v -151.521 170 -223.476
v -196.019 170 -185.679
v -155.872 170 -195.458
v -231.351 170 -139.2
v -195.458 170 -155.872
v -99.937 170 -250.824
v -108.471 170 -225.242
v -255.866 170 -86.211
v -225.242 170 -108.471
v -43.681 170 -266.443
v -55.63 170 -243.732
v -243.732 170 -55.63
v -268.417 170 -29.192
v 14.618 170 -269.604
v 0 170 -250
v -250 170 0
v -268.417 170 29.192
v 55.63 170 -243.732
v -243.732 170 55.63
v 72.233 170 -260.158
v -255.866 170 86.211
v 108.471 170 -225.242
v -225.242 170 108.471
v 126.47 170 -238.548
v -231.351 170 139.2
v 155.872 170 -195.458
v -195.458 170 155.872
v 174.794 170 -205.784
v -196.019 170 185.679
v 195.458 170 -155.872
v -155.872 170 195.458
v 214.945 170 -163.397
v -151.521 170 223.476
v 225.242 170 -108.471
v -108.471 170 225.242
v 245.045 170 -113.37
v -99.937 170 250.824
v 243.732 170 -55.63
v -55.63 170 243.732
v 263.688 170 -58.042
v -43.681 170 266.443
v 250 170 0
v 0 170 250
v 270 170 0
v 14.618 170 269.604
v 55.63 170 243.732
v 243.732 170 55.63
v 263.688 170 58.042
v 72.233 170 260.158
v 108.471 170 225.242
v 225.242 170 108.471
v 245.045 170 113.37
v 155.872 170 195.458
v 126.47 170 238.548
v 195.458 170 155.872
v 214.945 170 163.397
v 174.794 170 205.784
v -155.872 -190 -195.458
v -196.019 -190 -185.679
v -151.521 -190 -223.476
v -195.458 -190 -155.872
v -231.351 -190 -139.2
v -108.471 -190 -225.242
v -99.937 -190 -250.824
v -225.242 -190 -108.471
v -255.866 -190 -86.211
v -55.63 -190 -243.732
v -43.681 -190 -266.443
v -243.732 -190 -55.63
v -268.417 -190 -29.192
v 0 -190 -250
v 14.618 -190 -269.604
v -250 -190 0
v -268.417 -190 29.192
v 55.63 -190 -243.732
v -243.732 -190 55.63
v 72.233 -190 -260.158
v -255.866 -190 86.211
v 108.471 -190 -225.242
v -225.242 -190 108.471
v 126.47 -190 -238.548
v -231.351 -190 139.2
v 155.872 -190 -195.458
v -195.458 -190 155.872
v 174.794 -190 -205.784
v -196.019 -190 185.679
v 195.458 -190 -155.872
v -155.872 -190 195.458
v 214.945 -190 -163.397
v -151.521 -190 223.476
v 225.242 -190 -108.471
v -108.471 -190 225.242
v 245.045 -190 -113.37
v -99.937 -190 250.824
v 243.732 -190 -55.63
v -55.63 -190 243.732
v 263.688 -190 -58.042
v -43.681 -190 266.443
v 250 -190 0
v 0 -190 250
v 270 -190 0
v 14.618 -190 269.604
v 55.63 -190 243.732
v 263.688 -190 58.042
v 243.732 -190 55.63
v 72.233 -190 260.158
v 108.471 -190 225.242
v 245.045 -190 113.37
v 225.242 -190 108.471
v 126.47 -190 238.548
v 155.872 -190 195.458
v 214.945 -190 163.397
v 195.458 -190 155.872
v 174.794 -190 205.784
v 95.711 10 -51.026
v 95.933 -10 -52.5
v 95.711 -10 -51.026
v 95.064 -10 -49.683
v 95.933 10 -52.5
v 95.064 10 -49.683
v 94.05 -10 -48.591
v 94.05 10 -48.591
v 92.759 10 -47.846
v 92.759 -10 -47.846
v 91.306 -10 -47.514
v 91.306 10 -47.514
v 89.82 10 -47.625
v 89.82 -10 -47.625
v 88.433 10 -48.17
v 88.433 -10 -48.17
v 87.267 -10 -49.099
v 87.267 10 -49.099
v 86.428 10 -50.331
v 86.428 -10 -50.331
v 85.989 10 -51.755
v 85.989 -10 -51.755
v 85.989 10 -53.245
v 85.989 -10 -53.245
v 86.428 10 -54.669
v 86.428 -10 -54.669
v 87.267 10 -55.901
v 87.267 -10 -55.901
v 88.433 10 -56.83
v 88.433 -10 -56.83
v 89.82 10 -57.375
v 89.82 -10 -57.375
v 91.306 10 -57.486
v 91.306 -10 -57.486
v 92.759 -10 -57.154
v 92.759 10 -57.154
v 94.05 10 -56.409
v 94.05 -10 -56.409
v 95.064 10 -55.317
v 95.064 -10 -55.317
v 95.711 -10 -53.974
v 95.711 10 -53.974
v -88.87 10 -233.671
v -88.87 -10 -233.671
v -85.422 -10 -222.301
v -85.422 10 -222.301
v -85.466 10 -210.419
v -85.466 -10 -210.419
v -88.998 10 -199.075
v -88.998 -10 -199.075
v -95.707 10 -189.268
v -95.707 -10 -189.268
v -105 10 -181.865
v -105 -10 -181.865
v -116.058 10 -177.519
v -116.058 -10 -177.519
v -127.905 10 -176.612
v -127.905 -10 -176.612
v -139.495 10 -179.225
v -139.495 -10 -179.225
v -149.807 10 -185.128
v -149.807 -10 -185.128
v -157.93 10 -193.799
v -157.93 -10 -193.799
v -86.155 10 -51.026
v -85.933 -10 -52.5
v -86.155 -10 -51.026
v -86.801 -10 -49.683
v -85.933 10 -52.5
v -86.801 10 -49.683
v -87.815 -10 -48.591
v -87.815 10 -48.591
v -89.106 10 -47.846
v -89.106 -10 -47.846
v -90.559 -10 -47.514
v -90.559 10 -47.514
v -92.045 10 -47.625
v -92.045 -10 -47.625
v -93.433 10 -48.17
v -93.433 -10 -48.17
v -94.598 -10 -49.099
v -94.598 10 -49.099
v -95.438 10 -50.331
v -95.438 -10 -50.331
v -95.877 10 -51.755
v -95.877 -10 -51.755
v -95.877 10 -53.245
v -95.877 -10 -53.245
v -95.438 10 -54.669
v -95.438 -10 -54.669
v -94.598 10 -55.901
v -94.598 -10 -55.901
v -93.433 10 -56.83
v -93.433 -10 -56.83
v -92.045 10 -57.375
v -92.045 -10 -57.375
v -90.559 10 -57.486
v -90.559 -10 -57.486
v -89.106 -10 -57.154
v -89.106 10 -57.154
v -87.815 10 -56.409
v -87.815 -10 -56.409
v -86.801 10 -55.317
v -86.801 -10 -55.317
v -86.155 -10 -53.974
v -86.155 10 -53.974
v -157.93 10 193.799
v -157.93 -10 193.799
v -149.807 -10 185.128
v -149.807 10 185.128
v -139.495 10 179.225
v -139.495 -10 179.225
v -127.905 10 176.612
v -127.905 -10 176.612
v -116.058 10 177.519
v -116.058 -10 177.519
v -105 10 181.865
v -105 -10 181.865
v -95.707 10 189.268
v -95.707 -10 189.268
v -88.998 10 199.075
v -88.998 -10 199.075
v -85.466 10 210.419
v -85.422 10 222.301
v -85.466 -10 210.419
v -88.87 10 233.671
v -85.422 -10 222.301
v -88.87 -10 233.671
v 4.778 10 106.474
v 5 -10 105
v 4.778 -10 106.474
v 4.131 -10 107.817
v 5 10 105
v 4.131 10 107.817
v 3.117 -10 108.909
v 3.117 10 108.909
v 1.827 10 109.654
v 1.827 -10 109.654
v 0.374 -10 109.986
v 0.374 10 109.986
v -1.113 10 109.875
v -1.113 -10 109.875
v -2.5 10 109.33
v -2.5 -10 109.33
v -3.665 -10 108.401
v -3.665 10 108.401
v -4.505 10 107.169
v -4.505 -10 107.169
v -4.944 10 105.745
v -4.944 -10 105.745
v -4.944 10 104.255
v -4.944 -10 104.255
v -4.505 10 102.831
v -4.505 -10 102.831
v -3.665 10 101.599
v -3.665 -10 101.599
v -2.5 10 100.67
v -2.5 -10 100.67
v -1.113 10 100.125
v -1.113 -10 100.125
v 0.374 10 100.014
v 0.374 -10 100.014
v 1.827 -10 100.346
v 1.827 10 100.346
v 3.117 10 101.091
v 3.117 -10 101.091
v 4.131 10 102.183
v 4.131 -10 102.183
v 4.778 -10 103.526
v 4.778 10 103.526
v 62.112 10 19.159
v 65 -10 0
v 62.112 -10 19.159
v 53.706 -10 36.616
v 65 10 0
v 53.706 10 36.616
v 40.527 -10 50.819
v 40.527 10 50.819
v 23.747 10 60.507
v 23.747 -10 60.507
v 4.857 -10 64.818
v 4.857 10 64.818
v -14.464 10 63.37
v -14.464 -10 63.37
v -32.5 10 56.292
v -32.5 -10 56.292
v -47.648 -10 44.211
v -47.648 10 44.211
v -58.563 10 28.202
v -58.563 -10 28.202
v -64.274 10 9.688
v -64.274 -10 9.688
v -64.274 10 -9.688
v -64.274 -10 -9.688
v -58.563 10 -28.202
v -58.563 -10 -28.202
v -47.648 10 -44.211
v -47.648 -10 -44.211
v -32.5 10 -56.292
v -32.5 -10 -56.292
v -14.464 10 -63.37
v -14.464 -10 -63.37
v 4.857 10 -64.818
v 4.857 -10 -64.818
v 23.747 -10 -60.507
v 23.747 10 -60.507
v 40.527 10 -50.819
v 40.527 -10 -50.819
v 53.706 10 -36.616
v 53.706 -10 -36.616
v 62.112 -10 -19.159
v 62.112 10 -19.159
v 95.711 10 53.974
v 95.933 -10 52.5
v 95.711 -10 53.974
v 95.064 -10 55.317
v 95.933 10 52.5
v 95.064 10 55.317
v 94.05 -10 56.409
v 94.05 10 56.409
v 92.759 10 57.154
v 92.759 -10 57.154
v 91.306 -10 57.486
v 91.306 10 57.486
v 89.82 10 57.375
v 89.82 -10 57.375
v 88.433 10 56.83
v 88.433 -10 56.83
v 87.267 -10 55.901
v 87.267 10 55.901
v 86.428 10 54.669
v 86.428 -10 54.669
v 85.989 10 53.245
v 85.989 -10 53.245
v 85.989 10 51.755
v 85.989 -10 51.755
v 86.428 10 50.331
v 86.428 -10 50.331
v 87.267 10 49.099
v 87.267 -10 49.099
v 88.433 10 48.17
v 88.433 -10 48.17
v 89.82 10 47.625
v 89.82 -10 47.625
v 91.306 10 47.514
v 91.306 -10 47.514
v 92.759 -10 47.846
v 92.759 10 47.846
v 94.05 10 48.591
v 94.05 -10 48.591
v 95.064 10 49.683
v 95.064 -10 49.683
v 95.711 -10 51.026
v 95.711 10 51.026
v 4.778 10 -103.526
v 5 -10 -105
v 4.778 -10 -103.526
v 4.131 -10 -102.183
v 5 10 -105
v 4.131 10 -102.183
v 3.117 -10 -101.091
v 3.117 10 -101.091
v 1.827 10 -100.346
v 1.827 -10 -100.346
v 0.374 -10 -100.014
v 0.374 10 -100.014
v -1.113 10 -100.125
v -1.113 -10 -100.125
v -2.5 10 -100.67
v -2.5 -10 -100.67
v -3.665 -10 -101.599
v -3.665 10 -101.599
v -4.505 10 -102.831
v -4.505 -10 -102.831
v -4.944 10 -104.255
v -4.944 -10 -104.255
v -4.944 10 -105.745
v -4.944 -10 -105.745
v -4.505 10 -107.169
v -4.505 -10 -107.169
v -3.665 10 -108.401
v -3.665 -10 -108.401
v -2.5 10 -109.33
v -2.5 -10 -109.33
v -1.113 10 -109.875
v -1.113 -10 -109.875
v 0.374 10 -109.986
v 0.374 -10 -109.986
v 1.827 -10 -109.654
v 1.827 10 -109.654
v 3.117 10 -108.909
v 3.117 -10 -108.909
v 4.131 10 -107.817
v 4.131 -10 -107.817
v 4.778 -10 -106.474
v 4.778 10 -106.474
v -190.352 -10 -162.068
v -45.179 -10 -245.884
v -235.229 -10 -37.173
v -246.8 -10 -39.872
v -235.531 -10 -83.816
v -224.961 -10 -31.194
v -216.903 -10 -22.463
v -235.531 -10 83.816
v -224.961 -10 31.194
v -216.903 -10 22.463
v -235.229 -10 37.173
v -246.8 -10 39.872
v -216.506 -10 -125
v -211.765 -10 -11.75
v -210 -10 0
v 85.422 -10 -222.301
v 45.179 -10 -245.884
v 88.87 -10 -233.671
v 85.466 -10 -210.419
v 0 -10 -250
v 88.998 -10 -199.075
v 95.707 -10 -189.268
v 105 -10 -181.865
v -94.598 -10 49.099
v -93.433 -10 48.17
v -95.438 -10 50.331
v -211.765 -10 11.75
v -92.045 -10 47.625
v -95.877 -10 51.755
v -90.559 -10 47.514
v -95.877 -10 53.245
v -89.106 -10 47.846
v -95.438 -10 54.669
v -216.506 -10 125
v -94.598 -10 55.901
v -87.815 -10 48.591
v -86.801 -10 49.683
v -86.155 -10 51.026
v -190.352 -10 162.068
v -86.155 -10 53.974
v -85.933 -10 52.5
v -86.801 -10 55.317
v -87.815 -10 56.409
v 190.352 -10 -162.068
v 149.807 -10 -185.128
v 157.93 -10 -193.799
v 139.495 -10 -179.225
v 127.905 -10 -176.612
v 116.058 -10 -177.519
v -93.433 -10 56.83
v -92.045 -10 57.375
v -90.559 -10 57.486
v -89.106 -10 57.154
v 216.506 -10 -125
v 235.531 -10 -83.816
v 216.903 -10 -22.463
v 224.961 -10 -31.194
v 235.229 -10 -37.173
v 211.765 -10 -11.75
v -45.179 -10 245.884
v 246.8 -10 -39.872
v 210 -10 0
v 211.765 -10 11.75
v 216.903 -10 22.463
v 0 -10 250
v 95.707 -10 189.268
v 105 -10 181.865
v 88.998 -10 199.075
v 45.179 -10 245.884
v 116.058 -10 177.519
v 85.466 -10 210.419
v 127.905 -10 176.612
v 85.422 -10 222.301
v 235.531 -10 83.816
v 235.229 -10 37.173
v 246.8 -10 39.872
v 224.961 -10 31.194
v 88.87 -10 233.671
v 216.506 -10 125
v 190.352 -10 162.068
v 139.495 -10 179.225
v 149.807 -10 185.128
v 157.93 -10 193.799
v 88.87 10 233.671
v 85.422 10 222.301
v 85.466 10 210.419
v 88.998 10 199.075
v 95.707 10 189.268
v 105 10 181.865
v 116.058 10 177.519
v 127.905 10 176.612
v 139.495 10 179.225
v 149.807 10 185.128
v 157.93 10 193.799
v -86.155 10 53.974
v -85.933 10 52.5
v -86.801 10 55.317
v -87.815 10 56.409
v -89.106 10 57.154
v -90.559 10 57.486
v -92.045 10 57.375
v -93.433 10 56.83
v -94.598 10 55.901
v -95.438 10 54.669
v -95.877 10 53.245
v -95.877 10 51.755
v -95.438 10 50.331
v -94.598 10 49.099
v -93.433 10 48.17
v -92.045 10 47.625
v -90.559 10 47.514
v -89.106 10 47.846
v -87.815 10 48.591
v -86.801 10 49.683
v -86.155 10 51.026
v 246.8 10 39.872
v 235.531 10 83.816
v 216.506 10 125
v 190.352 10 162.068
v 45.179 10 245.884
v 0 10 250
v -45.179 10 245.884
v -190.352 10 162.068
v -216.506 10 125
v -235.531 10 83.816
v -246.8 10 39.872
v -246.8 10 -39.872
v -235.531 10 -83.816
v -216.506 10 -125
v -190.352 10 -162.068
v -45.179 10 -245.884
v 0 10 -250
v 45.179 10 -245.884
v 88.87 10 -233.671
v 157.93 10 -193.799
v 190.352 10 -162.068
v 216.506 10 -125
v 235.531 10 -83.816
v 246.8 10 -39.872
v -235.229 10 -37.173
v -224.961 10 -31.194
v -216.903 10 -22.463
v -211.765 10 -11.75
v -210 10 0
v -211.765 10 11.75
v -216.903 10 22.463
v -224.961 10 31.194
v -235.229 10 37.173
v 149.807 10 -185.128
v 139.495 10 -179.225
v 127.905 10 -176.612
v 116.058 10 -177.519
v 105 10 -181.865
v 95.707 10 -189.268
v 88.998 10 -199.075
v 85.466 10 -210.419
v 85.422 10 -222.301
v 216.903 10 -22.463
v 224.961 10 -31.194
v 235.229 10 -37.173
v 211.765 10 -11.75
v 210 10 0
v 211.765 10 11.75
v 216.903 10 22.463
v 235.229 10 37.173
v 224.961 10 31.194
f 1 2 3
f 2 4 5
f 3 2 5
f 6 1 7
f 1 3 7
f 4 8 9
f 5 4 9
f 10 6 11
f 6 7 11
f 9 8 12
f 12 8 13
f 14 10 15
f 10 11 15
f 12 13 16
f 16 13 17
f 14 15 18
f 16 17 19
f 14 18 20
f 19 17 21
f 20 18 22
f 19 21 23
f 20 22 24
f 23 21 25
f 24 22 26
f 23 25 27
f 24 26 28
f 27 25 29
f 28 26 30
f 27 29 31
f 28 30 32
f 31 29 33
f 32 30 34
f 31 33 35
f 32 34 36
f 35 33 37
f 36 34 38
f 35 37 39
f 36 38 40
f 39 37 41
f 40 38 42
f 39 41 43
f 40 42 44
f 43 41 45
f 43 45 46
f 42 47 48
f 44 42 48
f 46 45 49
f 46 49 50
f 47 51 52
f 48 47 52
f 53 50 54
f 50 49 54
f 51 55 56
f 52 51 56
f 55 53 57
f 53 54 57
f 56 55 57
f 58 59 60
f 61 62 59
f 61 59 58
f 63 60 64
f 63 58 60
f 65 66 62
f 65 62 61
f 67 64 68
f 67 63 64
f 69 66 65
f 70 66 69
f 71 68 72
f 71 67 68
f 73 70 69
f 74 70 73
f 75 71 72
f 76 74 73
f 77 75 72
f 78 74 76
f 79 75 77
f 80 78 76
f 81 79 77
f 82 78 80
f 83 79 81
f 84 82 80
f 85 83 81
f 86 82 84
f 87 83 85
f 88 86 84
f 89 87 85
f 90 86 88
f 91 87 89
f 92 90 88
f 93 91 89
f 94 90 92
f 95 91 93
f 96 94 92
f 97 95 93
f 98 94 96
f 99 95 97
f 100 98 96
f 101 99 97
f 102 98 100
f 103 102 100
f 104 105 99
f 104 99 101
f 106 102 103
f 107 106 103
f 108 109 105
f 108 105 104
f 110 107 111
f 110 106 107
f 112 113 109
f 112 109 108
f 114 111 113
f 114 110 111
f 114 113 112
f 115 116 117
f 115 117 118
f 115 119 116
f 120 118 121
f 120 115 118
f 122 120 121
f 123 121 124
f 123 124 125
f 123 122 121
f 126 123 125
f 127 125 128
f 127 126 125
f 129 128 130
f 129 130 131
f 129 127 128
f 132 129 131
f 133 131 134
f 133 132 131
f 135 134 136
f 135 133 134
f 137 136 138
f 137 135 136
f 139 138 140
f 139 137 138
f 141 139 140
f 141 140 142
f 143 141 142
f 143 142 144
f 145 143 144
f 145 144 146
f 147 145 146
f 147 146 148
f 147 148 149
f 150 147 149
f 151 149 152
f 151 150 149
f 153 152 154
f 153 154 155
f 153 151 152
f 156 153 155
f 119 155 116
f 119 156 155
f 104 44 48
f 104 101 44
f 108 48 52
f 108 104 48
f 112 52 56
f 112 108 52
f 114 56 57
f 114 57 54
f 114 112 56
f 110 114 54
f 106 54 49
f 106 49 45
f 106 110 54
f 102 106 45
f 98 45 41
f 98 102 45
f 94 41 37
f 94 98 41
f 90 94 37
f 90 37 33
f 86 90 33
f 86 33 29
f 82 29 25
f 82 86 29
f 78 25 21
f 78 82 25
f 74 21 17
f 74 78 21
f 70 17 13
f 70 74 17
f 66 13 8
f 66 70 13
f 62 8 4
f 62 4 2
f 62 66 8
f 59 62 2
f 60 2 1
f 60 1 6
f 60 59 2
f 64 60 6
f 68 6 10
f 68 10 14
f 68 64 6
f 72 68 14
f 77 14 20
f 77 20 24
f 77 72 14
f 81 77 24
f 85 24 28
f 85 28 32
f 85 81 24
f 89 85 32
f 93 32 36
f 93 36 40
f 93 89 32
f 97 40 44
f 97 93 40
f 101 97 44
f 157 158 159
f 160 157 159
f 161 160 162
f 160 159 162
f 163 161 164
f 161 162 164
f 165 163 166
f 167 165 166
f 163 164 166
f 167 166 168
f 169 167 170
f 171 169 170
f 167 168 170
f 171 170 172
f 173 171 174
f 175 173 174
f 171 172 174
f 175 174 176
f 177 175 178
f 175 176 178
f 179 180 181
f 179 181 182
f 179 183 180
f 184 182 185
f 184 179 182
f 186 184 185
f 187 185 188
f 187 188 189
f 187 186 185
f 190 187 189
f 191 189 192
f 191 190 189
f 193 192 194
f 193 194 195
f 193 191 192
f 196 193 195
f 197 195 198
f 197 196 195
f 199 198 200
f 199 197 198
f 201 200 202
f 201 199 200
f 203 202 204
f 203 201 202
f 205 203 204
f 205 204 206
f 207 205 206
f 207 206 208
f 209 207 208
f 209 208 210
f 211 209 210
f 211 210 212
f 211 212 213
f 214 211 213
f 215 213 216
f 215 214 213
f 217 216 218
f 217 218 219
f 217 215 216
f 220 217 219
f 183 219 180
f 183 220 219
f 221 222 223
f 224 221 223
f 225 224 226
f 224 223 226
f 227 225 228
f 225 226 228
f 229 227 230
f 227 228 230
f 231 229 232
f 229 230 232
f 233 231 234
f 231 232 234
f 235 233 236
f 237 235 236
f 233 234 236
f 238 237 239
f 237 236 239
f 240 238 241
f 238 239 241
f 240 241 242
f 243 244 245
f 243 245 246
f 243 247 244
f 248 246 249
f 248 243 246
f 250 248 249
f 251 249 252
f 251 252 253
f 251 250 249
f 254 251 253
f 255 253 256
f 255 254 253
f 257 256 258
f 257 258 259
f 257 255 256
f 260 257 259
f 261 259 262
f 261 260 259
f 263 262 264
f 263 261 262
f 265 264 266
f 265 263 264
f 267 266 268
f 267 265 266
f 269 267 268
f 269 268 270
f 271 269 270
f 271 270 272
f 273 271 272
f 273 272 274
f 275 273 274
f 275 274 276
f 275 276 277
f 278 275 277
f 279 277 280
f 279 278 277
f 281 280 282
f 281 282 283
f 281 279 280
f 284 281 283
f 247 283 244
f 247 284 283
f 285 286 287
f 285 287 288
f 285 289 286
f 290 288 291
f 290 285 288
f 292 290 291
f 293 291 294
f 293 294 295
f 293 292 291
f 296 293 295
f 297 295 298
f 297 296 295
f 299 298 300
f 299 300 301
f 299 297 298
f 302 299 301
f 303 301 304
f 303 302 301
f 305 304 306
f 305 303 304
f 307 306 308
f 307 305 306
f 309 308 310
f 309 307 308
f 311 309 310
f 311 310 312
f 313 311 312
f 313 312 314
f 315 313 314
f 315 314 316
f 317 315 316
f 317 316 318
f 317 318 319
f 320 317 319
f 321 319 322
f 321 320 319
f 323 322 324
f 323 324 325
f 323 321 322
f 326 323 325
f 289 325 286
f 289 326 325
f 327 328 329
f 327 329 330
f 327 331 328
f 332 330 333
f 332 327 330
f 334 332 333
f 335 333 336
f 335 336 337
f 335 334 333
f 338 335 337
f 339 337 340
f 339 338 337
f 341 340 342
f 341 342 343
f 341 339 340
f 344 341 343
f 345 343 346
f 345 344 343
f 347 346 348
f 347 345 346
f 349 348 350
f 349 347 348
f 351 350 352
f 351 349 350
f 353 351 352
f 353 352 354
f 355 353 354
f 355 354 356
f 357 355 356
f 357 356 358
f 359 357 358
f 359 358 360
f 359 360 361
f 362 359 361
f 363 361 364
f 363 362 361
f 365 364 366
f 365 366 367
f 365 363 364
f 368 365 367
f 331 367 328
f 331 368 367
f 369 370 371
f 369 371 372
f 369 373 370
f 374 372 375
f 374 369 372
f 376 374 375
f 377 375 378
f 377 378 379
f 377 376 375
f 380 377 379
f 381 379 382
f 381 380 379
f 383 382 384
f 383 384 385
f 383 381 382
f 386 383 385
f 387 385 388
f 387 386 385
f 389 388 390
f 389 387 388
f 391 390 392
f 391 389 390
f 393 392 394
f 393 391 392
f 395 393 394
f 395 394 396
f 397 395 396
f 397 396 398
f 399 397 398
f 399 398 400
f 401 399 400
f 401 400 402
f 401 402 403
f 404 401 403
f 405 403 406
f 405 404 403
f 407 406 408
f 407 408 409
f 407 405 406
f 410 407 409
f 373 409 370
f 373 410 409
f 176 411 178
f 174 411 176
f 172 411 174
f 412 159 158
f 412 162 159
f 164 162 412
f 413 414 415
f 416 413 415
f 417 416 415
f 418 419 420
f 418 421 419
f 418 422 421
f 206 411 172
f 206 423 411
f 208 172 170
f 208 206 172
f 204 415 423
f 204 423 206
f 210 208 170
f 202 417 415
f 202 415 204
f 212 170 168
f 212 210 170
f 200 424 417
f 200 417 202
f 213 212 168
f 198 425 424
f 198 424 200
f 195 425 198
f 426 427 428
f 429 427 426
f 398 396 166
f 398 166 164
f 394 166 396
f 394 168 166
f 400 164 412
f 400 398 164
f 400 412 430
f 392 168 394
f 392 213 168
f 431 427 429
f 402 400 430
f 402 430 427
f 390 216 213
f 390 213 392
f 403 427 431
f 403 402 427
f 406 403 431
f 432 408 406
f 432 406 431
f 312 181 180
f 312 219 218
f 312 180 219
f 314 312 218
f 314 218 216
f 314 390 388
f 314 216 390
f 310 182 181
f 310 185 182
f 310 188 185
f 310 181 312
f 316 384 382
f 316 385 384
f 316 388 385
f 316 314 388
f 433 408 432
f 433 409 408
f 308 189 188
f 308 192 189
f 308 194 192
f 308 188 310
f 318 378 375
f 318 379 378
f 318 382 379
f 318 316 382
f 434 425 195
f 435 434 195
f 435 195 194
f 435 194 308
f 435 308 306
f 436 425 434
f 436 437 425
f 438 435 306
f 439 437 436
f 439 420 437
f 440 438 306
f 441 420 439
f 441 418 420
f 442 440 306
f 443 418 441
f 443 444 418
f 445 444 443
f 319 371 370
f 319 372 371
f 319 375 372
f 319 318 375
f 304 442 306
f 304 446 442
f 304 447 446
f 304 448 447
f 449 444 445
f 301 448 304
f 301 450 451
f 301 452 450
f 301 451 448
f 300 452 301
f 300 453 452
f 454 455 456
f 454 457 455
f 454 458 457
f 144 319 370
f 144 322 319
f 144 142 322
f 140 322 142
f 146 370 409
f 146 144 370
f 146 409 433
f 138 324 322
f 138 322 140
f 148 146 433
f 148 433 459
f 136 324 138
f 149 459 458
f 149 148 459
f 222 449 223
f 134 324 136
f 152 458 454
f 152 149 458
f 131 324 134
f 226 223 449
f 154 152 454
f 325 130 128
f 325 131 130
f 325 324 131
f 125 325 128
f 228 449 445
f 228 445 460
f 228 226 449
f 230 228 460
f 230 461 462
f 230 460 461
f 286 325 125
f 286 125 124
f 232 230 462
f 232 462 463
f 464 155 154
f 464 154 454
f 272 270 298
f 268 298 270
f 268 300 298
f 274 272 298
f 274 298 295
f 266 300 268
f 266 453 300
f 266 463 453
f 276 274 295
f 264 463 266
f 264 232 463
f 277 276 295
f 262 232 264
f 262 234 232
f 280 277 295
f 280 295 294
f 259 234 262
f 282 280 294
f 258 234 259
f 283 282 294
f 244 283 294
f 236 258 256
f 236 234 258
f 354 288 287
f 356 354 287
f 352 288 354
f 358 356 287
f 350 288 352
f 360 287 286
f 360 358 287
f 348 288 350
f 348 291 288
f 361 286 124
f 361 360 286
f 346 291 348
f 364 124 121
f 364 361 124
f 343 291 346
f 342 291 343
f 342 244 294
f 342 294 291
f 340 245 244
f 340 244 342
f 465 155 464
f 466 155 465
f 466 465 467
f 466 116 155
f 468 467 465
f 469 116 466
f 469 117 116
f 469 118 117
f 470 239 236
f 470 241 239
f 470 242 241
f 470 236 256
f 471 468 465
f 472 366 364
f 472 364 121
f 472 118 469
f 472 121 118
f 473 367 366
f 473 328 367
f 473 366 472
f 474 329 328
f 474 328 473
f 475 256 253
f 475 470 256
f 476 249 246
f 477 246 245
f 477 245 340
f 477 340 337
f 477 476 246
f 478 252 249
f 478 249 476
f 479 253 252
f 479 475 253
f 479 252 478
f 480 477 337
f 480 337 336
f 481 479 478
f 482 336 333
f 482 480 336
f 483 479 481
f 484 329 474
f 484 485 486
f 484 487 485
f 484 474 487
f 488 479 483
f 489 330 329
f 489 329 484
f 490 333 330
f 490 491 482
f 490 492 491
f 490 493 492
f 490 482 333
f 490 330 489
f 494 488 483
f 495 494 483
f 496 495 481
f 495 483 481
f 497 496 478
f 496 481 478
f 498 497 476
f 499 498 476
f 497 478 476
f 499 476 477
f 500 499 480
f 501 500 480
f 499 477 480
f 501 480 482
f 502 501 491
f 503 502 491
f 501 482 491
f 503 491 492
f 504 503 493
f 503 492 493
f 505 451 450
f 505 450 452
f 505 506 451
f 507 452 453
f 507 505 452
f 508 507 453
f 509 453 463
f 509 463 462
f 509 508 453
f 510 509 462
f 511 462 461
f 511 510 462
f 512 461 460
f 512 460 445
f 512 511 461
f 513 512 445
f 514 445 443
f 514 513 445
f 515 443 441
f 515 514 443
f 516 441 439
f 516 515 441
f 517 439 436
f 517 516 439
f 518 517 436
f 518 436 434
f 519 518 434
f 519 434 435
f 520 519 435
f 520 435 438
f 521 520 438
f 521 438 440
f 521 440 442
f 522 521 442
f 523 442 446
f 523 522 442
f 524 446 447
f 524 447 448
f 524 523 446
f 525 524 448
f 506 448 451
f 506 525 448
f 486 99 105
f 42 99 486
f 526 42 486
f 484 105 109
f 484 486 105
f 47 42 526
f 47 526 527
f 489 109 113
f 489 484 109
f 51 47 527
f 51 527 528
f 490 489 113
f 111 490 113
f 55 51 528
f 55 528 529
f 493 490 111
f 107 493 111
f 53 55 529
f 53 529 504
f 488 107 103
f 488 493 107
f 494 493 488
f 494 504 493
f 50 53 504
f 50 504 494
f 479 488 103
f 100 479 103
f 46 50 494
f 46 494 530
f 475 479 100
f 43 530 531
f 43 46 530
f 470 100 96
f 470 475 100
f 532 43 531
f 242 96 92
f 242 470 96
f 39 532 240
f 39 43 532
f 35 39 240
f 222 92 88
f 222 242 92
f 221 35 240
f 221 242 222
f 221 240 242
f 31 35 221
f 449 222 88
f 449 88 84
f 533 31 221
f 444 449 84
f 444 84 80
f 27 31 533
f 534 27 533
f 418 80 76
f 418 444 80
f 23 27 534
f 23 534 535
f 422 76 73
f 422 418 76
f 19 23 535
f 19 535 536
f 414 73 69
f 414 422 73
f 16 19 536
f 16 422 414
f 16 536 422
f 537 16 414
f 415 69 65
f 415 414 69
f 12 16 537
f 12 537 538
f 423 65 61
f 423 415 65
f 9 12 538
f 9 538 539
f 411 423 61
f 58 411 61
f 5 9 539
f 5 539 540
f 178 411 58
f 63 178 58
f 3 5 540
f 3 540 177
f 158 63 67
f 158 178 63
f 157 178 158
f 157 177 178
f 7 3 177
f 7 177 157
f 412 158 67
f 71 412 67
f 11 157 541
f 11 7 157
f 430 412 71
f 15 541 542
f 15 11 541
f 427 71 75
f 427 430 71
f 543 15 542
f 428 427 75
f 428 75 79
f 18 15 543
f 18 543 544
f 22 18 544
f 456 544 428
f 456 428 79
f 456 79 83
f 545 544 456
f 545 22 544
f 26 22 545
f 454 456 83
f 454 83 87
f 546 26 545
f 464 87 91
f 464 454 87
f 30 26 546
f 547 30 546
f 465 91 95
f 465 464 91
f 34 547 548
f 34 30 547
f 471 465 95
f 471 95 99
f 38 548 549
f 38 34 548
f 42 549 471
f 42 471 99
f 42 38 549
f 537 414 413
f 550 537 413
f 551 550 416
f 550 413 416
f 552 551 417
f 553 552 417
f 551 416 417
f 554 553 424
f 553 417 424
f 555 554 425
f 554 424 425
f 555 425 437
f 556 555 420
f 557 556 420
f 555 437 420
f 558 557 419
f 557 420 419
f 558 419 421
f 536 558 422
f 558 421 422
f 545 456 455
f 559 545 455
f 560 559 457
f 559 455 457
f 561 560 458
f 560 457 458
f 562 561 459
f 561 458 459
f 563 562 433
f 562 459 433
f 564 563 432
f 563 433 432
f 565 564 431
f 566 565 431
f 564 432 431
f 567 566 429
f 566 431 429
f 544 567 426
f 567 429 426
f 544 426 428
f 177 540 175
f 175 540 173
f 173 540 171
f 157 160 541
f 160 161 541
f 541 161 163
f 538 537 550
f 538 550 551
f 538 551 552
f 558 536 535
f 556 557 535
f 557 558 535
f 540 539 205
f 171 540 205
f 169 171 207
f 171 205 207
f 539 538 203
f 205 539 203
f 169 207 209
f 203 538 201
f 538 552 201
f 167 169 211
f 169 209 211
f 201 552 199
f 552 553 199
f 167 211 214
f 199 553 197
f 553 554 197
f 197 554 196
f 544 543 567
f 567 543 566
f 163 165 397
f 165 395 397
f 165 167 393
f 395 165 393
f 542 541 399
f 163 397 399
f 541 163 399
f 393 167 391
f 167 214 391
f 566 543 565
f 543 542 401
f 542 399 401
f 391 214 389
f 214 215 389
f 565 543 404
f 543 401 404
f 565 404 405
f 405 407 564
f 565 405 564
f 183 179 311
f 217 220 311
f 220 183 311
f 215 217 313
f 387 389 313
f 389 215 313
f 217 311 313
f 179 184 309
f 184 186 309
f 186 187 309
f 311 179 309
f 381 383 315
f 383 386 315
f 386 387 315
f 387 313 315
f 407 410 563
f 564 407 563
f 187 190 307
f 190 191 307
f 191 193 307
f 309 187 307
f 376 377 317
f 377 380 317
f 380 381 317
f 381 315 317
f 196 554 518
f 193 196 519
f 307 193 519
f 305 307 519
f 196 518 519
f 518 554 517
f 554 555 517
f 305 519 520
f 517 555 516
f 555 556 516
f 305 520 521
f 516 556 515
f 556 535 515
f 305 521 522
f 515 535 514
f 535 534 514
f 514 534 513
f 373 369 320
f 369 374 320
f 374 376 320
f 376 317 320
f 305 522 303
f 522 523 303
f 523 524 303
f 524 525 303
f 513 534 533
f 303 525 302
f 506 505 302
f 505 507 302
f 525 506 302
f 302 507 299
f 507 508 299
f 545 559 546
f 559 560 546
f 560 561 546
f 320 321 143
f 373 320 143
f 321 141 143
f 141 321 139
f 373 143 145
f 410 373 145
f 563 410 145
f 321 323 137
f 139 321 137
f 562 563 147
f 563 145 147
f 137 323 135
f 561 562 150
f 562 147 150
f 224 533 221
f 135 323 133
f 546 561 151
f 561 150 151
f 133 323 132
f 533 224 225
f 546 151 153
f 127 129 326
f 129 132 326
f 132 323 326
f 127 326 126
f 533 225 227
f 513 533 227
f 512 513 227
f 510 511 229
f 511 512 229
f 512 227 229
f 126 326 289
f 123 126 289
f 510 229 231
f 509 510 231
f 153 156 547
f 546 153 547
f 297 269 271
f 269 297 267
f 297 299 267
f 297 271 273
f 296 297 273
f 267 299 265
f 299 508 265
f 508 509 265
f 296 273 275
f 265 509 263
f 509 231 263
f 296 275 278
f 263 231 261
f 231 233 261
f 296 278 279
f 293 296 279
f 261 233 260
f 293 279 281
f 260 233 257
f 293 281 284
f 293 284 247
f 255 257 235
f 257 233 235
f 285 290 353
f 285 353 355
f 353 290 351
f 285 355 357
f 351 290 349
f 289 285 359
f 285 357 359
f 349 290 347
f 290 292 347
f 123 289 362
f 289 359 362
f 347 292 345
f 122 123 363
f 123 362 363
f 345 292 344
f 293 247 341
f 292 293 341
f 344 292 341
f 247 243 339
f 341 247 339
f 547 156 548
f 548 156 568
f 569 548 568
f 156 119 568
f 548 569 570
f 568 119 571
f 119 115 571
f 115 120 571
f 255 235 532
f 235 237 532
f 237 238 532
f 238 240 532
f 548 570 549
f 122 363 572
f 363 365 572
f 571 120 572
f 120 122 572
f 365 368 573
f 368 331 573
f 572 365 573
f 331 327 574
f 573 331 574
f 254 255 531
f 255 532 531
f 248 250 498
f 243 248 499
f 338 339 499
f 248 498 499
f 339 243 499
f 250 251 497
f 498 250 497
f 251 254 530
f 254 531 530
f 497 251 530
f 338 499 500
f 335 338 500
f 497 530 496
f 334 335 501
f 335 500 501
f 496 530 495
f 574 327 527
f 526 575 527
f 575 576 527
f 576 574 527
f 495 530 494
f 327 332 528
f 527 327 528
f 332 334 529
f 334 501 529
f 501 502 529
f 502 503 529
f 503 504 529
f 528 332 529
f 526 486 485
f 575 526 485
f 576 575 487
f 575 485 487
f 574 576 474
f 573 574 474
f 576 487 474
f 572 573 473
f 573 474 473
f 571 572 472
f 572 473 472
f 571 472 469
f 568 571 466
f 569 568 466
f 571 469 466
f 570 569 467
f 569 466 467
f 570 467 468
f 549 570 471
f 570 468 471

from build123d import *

# Parameters (mm, degrees)
F0_R     = 250
F0_R_2   = 5
F0_R_3   = 65
F1_DEPTH = 10
F3_DEPTH = 20.001
F4_R     = 270
F4_R_2   = 250
F5_DEPTH = 180


with BuildPart() as f1:
    # F0 (on Front) → F1 (new body, symmetric)
    with BuildSketch(Plane.XZ):
        Circle(F0_R)
        with Locations((-90.932667, -52.5)):
            Circle(F0_R_2, mode=Mode.SUBTRACT)
        with Locations((0, -105)):
            Circle(F0_R_2, mode=Mode.SUBTRACT)
        with Locations((90.932667, -52.5)):
            Circle(F0_R_2, mode=Mode.SUBTRACT)
        with Locations((-90.932667, 52.5)):
            Circle(F0_R_2, mode=Mode.SUBTRACT)
        Circle(F0_R_3, mode=Mode.SUBTRACT)
        with Locations((90.932667, 52.5)):
            Circle(F0_R_2, mode=Mode.SUBTRACT)
        with Locations((0, 105)):
            Circle(F0_R_2, mode=Mode.SUBTRACT)
    extrude(amount=F1_DEPTH, both=True)

    # F2 (on face) → F3 (cut, through all)
    with BuildSketch(Plane.XZ.offset(10)):
        with BuildLine():
            ThreePointArc((157.929987, 193.799172), (125, 216.506351), (88.870013, 233.670967))
            ThreePointArc((88.870013, 233.670967), (105, 181.865335), (157.929987, 193.799172))
        make_face()
        with BuildLine():
            ThreePointArc((250, 0), (249.198716, 20), (246.8, 39.871795))
            ThreePointArc((246.8, 39.871795), (210, 0), (246.8, -39.871795))
            ThreePointArc((246.8, -39.871795), (249.198716, -20), (250, 0))
        make_face()
        with BuildLine():
            ThreePointArc((88.870013, -233.670967), (125, -216.506351), (157.929987, -193.799172))
            ThreePointArc((157.929987, -193.799172), (105, -181.865335), (88.870013, -233.670967))
        make_face()
        with BuildLine():
            ThreePointArc((-88.870013, -233.670967), (-105, -181.865335), (-157.929987, -193.799172))
            ThreePointArc((-157.929987, -193.799172), (-125, -216.506351), (-88.870013, -233.670967))
        make_face()
        with BuildLine():
            ThreePointArc((-246.8, -39.871795), (-210, 0), (-246.8, 39.871795))
            ThreePointArc((-246.8, 39.871795), (-250, 0), (-246.8, -39.871795))
        make_face()
        with BuildLine():
            ThreePointArc((-157.929987, 193.799172), (-105, 181.865335), (-88.870013, 233.670967))
            ThreePointArc((-88.870013, 233.670967), (-125, 216.506351), (-157.929987, 193.799172))
        make_face()
    extrude(amount=-F3_DEPTH, mode=Mode.SUBTRACT)

    # F4 (on face) → F5 (join, symmetric)
    with BuildSketch(Plane.XZ.offset(10)):
        Circle(F4_R)
        Circle(F4_R_2, mode=Mode.SUBTRACT)
    extrude(amount=F5_DEPTH, both=True)


solid = f1.part
